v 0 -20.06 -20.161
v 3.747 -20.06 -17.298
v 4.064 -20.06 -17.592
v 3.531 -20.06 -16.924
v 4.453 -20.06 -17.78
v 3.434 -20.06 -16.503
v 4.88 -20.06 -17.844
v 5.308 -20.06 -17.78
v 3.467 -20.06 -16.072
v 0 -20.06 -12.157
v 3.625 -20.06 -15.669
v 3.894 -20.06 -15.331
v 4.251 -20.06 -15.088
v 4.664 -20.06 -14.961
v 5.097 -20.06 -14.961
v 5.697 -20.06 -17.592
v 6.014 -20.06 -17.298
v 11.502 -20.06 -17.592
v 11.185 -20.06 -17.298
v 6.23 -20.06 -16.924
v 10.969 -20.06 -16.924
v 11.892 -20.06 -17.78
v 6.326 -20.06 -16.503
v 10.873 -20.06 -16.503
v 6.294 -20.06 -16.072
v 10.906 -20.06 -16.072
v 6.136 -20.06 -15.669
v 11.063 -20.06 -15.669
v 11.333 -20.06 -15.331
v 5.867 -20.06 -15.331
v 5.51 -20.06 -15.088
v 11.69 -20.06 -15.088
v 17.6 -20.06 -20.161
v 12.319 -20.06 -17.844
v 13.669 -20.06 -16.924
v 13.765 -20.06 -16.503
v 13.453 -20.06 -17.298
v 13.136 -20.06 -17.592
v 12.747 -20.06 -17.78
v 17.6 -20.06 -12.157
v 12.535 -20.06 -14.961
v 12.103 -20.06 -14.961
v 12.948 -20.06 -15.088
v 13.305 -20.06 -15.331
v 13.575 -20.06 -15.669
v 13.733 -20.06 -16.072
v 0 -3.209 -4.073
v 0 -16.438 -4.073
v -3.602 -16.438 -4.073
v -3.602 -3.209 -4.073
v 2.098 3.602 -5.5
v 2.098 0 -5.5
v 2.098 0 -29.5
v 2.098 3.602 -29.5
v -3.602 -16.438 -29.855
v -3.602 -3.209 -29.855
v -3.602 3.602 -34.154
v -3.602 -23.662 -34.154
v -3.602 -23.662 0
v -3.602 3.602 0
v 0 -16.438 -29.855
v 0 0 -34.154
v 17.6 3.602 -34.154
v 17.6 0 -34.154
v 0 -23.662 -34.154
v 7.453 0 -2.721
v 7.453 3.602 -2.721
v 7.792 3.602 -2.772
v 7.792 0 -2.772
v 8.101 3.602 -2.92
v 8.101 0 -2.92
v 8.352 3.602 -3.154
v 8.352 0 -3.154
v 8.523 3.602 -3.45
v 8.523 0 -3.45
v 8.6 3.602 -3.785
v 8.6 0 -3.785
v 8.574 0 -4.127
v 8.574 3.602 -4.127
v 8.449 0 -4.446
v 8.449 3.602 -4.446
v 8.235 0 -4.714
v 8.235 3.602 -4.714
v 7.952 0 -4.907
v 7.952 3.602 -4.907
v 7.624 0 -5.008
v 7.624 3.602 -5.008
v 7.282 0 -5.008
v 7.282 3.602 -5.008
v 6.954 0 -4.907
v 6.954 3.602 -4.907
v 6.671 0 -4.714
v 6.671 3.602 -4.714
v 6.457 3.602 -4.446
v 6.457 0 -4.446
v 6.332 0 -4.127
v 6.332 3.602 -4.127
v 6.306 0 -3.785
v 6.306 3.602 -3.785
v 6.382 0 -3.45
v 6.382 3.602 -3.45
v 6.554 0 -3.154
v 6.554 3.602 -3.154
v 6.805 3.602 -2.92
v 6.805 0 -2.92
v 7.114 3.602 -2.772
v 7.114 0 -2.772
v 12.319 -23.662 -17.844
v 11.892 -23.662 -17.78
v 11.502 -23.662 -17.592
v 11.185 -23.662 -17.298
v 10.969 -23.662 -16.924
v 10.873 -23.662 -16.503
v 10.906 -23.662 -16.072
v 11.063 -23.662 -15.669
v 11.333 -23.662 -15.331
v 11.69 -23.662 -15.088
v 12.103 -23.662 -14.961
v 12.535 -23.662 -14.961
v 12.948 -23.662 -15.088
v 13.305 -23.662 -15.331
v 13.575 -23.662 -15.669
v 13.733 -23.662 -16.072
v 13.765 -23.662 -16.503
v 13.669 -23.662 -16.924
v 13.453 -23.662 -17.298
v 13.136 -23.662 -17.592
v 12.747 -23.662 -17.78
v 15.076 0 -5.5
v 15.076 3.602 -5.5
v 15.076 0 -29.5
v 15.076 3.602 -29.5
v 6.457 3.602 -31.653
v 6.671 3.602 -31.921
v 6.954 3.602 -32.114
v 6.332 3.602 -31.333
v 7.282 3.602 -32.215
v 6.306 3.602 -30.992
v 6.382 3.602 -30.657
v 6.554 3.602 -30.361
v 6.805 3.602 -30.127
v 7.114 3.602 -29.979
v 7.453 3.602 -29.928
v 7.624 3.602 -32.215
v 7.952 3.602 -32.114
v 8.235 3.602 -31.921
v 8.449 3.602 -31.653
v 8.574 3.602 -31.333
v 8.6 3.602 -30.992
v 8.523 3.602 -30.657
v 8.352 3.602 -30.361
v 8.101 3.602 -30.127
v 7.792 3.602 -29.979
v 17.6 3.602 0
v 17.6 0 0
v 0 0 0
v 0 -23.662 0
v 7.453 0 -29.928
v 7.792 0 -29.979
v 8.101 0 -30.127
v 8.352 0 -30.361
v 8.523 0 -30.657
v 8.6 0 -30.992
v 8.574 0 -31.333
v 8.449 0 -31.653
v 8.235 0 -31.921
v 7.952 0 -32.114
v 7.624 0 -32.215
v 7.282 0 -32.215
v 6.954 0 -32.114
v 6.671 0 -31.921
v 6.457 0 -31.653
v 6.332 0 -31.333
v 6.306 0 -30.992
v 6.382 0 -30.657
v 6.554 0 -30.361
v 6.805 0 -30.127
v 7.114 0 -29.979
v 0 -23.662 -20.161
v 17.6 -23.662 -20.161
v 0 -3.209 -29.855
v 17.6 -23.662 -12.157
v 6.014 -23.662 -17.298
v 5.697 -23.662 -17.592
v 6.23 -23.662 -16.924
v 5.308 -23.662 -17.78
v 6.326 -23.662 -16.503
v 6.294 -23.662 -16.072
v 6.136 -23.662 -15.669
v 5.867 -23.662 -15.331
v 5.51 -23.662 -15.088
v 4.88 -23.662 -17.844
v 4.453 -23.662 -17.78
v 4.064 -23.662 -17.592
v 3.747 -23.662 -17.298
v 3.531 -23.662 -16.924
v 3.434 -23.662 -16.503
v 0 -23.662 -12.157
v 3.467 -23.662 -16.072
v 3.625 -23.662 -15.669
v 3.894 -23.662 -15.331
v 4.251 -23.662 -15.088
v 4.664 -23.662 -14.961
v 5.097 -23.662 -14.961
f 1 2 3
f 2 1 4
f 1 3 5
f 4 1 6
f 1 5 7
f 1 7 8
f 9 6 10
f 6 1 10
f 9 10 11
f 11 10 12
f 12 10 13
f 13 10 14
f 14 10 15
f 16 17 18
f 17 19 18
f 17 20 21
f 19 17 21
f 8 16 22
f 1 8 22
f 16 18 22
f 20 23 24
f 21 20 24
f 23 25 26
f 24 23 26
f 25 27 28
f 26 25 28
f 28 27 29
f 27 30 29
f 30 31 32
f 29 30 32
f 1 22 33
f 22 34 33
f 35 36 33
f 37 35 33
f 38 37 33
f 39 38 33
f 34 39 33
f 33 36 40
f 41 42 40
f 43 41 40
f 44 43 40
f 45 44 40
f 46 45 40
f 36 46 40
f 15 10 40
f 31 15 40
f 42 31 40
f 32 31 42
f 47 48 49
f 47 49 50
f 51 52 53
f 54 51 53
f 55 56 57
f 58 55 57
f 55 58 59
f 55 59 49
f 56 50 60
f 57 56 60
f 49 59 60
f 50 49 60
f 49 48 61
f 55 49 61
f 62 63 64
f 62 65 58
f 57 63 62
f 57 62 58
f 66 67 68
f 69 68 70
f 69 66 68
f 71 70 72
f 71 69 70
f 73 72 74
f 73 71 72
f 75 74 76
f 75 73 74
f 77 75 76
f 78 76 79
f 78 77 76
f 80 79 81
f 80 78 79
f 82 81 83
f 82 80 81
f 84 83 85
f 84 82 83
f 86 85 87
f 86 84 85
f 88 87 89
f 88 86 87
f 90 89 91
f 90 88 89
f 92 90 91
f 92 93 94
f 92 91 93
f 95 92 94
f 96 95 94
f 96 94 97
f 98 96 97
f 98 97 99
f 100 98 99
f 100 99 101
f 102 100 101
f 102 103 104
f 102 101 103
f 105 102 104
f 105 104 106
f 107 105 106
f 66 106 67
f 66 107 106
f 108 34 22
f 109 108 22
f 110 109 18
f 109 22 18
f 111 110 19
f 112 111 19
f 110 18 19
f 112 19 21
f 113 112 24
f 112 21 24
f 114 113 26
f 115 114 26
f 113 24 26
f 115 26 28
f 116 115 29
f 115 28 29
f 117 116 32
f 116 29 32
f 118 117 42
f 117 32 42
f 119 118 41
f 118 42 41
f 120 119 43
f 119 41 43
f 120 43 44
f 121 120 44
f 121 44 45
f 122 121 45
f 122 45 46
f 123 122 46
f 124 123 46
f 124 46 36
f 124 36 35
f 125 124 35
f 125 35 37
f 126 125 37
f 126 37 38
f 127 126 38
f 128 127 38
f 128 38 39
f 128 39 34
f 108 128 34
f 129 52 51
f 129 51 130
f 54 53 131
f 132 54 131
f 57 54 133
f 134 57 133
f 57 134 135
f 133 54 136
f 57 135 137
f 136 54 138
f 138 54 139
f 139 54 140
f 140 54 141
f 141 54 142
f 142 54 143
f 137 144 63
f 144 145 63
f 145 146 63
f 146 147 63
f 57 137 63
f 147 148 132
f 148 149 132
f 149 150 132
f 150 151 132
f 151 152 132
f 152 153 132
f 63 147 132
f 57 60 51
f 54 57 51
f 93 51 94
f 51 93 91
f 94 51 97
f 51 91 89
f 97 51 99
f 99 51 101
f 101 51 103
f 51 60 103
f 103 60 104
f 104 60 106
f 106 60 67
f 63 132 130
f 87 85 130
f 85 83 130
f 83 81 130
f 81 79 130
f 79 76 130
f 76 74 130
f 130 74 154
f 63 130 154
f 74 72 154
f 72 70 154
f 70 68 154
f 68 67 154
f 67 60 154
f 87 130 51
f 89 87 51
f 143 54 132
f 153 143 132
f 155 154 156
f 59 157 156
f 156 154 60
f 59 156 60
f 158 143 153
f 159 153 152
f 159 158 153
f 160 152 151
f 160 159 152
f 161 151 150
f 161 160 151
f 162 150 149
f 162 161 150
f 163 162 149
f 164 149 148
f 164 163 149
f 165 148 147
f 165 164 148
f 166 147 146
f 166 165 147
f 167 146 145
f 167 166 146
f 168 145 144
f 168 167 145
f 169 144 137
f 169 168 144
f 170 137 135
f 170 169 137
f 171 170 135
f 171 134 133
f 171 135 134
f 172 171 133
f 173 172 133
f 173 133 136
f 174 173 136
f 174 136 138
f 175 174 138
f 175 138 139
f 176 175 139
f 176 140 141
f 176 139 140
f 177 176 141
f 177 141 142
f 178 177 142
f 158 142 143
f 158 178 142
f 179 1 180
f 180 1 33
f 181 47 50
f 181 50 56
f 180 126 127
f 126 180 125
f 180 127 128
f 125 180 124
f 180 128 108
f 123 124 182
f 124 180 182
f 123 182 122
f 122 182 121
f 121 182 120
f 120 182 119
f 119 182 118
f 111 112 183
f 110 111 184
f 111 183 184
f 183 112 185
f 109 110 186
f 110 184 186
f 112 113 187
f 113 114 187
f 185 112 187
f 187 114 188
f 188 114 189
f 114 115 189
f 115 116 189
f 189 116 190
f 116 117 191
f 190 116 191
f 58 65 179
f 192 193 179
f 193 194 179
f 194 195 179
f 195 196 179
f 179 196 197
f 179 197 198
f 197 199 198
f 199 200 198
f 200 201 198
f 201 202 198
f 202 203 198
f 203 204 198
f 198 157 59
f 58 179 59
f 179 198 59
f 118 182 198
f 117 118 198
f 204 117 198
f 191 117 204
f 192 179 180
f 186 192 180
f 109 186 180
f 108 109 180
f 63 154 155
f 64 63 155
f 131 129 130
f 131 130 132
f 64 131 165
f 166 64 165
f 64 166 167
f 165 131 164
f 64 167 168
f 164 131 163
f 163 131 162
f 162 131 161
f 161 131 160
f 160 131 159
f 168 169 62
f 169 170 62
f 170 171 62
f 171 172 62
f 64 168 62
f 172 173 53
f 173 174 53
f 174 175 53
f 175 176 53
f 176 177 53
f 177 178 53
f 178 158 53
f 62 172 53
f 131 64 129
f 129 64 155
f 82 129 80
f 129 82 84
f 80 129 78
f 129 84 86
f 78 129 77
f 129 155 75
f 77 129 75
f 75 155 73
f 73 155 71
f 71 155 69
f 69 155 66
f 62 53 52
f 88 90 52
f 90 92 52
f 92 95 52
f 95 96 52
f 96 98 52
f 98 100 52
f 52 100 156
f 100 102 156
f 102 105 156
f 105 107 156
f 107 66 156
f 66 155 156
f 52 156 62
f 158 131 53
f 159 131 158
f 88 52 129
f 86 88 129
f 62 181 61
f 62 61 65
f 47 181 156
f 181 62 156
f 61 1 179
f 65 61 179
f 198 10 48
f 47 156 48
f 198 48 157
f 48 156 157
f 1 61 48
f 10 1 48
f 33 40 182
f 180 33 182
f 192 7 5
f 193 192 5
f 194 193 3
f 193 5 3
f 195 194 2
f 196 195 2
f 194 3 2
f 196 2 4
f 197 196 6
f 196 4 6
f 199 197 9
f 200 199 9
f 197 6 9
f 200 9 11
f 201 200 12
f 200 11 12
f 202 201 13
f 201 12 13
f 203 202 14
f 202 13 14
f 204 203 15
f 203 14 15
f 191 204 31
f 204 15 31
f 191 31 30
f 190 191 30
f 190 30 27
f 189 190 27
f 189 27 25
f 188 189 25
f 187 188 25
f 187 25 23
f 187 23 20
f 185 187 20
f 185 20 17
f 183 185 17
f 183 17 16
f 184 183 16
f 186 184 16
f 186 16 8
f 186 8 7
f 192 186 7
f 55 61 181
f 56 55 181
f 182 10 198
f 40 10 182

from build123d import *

# Parameters (mm, degrees)
EXTRUDE_THIN1_DEPTH = 34.154055886
SKETCH5_R           = 1.15
SKETCH5_W           = 12.978284002
SKETCH5_H           = 24
CUT_EXTRUDE7_DEPTH  = 8
SKETCH6_W           = 17.6
SKETCH6_H           = 13.993236592
SKETCH6_H_2         = 12.157086016
CUT_EXTRUDE8_DEPTH  = 29
SKETCH7_R           = 1.45
CUT_EXTRUDE9_DEPTH  = 33
SKETCH8_W           = 25.782103653
SKETCH8_H           = 13.229301
CUT_EXTRUDE10_DEPTH = 16


with BuildPart() as part:
    # Sketch1 → Extrude-Thin1 (new body)
    with BuildSketch(Plane.XY):
        Polygon((17.6, 0), (0, 0), (0, -20.0603024), (17.6, -20.0603024), (17.6, -23.662253526), (-3.601951126, -23.662253526), (-3.601951126, 3.601951126), (17.6, 3.601951126), align=None)
    extrude(amount=-EXTRUDE_THIN1_DEPTH)

    # Sketch5 → Cut-Extrude7 (cut)
    with BuildSketch(Plane(origin=(0, 0, 0), x_dir=(1, 0, 0), z_dir=(0, 1, 0))):
        with Locations(Location((7.452972893, 31.077545708, 0), (0, 0, 270))):
            Circle(SKETCH5_R)
        with Locations(Location((7.452972893, 3.870616702, 0), (0, 0, 270))):
            Circle(SKETCH5_R)
        with Locations((8.587190875, 17.5)):
            Rectangle(SKETCH5_W, SKETCH5_H)
    extrude(amount=CUT_EXTRUDE7_DEPTH, mode=Mode.SUBTRACT)

    # Sketch6 → Cut-Extrude8 (cut)
    with BuildSketch(Plane(origin=(0, 0, 0), x_dir=(1, 0, 0), z_dir=(0, 1, 0))):
        with Locations((8.8, 27.15743759)):
            Rectangle(SKETCH6_W, SKETCH6_H)
        with Locations((8.8, 6.078543008)):
            Rectangle(SKETCH6_W, SKETCH6_H_2)
    extrude(amount=-CUT_EXTRUDE8_DEPTH, mode=Mode.SUBTRACT)

    # Sketch7 → Cut-Extrude9 (cut)
    with BuildSketch(Plane(origin=(0, 0, 0), x_dir=(1, 0, 0), z_dir=(0, 1, 0))):
        with Locations(Location((4.880389158, 16.394356575, 0), (0, 0, 90))):
            Circle(SKETCH7_R)
        with Locations(Location((12.319153027, 16.394356575, 0), (0, 0, 90))):
            Circle(SKETCH7_R)
    extrude(amount=-CUT_EXTRUDE9_DEPTH, mode=Mode.SUBTRACT)

    # Sketch8 → Cut-Extrude10 (cut)
    with BuildSketch(Plane(origin=(0, 0, 0), x_dir=(0, 0, -1), z_dir=(1, 0, 0))):
        with Locations((16.964278219, -9.823443372)):
            Rectangle(SKETCH8_W, SKETCH8_H)
    extrude(amount=-CUT_EXTRUDE10_DEPTH, mode=Mode.SUBTRACT)


solid = part.part
